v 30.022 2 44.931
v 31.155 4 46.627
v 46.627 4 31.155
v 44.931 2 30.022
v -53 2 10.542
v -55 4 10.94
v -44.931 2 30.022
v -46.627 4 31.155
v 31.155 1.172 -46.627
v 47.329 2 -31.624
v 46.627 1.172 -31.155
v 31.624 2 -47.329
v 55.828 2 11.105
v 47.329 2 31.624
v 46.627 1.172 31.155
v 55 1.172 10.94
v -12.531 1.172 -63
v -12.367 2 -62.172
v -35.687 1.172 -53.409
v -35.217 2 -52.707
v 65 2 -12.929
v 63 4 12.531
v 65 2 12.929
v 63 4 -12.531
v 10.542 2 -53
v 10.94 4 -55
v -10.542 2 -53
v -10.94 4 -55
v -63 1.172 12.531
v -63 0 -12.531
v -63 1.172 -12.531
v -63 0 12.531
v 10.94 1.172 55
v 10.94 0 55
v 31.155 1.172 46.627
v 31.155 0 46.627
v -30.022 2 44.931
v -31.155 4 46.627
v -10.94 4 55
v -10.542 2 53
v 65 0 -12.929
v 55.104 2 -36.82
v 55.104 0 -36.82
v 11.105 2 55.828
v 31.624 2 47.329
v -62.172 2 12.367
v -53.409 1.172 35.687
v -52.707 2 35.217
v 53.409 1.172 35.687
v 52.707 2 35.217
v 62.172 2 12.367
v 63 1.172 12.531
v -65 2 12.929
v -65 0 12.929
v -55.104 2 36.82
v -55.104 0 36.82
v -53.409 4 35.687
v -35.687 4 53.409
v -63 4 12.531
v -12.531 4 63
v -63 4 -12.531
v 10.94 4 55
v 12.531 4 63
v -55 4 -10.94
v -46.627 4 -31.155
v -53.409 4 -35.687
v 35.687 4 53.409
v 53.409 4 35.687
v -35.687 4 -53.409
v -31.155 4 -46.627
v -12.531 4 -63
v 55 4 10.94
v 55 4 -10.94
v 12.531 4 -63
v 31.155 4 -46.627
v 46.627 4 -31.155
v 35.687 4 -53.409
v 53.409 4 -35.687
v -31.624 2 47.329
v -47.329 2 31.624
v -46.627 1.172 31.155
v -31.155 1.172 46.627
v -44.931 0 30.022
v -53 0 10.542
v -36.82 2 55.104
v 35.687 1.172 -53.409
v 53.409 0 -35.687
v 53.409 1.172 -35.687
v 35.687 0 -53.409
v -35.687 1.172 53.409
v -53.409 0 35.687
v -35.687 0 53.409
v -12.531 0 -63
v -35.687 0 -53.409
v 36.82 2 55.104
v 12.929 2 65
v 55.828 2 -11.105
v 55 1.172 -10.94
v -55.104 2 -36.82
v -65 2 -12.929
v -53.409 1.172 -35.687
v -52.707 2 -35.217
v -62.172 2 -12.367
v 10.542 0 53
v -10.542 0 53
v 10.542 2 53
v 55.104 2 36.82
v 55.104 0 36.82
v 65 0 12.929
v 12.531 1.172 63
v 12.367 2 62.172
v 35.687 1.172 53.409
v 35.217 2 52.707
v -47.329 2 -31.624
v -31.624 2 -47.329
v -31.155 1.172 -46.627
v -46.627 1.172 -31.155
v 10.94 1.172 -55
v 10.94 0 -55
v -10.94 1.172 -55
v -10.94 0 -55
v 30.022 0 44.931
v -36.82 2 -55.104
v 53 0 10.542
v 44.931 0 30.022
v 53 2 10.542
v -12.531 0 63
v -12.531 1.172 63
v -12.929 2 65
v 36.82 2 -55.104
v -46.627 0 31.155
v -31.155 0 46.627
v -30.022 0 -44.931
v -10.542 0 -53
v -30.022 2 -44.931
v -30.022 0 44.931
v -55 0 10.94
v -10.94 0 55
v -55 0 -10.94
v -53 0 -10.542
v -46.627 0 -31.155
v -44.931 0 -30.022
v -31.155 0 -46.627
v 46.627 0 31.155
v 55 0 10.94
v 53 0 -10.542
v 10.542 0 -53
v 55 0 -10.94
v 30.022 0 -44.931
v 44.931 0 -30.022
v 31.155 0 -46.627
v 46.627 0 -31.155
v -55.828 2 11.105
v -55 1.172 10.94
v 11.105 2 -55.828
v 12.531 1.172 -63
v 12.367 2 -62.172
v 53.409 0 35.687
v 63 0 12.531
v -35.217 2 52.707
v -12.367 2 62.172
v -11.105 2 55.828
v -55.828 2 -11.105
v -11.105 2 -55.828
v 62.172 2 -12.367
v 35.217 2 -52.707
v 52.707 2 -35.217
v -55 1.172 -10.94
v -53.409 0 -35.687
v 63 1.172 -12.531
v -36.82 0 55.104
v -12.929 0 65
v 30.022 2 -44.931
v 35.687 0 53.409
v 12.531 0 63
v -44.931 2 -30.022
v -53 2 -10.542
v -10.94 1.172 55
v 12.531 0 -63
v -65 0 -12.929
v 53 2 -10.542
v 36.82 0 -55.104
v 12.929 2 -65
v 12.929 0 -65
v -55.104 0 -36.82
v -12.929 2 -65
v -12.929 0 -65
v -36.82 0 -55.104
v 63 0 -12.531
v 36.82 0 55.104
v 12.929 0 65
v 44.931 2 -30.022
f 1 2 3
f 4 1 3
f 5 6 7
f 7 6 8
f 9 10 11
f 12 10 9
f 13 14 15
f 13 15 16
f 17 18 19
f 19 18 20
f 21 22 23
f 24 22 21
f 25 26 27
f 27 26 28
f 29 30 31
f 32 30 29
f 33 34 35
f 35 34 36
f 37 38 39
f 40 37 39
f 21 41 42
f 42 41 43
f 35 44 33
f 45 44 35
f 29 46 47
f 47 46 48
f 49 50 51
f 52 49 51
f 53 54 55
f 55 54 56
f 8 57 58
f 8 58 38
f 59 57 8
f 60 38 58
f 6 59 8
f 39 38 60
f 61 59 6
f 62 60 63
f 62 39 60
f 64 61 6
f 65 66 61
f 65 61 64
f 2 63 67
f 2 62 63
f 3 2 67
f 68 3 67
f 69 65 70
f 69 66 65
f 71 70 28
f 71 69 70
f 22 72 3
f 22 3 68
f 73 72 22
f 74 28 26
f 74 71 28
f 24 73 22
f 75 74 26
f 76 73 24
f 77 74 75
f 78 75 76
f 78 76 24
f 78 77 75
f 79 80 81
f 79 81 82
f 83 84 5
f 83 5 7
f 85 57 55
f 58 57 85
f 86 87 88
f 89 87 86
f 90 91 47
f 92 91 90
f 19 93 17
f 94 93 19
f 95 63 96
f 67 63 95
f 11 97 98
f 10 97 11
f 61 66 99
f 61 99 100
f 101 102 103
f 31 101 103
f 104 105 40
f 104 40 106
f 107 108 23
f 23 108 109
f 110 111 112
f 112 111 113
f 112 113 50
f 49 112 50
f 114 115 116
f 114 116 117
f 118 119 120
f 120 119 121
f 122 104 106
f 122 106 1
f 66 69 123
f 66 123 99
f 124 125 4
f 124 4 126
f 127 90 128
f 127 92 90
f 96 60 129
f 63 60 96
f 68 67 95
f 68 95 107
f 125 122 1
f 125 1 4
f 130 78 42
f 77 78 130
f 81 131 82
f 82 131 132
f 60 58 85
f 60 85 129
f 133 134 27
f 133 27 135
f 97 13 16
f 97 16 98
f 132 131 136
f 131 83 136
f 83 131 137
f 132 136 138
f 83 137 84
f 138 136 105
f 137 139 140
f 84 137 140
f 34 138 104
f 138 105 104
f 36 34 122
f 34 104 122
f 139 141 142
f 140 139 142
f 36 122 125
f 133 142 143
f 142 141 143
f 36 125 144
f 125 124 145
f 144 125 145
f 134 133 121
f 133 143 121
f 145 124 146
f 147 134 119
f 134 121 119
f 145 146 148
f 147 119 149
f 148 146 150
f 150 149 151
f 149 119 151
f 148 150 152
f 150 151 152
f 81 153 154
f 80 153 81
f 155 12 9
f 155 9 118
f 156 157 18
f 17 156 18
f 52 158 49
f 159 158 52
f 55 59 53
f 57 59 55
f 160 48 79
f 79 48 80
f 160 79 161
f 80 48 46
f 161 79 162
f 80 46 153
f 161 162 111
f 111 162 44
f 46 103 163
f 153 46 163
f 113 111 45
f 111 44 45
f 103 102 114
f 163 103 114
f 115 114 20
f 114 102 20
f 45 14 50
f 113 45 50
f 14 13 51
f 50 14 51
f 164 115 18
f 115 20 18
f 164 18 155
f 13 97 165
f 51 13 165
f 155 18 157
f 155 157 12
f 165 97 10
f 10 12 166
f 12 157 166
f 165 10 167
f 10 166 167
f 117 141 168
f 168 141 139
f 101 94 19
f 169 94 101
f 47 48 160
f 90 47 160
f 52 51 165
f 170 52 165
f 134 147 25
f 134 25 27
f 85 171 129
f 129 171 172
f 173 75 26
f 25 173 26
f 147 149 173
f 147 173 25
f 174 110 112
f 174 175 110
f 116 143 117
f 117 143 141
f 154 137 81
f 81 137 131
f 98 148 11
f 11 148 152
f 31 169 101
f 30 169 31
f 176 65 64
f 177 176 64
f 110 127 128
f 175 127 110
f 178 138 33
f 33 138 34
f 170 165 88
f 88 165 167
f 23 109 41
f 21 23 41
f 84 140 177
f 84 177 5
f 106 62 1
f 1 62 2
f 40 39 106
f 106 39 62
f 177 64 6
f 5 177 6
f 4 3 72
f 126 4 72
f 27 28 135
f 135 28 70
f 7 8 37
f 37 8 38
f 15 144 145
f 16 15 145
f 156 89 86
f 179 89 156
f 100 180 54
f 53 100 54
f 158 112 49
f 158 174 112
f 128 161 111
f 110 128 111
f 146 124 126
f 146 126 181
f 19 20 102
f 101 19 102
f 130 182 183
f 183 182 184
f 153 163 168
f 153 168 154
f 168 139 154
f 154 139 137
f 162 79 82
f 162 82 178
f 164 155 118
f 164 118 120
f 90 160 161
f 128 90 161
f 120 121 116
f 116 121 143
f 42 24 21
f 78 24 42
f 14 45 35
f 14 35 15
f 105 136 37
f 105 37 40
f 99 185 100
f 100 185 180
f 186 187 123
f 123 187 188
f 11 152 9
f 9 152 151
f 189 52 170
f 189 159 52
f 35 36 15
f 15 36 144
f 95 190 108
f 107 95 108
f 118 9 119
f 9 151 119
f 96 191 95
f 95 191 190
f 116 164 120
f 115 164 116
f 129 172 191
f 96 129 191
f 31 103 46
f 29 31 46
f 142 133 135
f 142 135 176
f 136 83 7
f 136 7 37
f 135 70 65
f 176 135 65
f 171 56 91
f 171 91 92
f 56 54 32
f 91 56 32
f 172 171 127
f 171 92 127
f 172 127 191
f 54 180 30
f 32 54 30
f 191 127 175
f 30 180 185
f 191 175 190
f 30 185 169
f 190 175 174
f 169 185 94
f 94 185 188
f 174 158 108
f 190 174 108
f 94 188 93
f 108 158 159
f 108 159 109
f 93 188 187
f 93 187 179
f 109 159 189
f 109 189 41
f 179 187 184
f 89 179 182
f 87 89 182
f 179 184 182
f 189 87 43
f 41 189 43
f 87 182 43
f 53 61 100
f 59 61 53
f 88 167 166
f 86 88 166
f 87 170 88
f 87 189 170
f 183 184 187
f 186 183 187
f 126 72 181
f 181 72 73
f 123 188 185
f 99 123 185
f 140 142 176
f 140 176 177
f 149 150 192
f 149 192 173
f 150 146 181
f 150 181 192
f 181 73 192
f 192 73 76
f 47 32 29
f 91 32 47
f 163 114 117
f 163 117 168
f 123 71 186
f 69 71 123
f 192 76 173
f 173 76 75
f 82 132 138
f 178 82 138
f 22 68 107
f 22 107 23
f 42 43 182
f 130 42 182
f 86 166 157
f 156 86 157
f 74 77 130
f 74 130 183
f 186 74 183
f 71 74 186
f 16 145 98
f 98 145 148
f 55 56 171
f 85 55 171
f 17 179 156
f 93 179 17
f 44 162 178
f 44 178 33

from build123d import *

# Parameters (mm, degrees)
BOSS_EXTRUDE1_DEPTH = 4
CHAMFER1_SIZE       = 2
SHELL1_T            = -2


with BuildPart() as part:
    # Sketch1 → Boss-Extrude1 (new body)
    with BuildSketch(Plane(origin=(0, 0, 0), x_dir=(1, 0, 0), z_dir=(0, 1, 0))):
        Polygon((36.819542328, 55.104339226), (12.92930388, 65), (-12.92930388, 65), (-36.819542328, 55.104339226), (-55.104339226, 36.819542328), (-65, 12.92930388), (-65, -12.92930388), (-55.104339226, -36.819542328), (-36.819542328, -55.104339226), (-12.92930388, -65), (12.92930388, -65), (36.819542328, -55.104339226), (55.104339226, -36.819542328), (65, -12.92930388), (65, 12.92930388), (55.104339226, 36.819542328), align=None)
        Polygon((10.542355471, 53), (-10.542355471, 53), (-30.02208836, 44.931230446), (-44.931230446, 30.02208836), (-53, 10.542355471), (-53, -10.542355471), (-44.931230446, -30.02208836), (-30.02208836, -44.931230446), (-10.542355471, -53), (10.542355471, -53), (30.02208836, -44.931230446), (44.931230446, -30.02208836), (53, -10.542355471), (53, 10.542355471), (44.931230446, 30.02208836), (30.02208836, 44.931230446), align=None, mode=Mode.SUBTRACT)
    extrude(amount=BOSS_EXTRUDE1_DEPTH)

    # Chamfer1
    chamfer1_edges = [part.edges().sort_by_distance(p)[0] for p in [
        (0, 4, -65),
        (-24.874423104, 4, -60.052169613),
        (-45.961940777, 4, -45.961940777),
        (-60.052169613, 4, -24.874423104),
        (-65, 4, 0),
        (-60.052169613, 4, 24.874423104),
        (-45.961940777, 4, 45.961940777),
        (-24.874423104, 4, 60.052169613),
        (0, 4, 65),
        (24.874423104, 4, 60.052169613),
        (45.961940777, 4, -45.961940777),
        (45.961940777, 4, 45.961940777),
        (60.052169613, 4, 24.874423104),
        (20.282221915, 4, -48.965615223),
        (0, 4, -53),
        (-20.282221915, 4, -48.965615223),
        (-37.476659403, 4, -37.476659403),
        (-48.965615223, 4, -20.282221915),
        (-53, 4, 0),
        (-48.965615223, 4, 20.282221915),
        (65, 4, 0),
        (-37.476659403, 4, 37.476659403),
        (-20.282221915, 4, 48.965615223),
        (0, 4, 53),
        (20.282221915, 4, 48.965615223),
        (37.476659403, 4, 37.476659403),
        (48.965615223, 4, 20.282221915),
        (53, 4, 0),
        (48.965615223, 4, -20.282221915),
        (37.476659403, 4, -37.476659403),
        (60.052169613, 4, -24.874423104),
        (24.874423104, 4, -60.052169613),
    ]]
    chamfer(chamfer1_edges, length=CHAMFER1_SIZE)

    # Shell1
    shell1_openings = [part.faces().sort_by_distance(p)[0] for p in [
        (24.170868174, 0, -58.353637759),
    ]]
    offset(amount=SHELL1_T, openings=shell1_openings, kind=Kind.INTERSECTION)


solid = part.part
